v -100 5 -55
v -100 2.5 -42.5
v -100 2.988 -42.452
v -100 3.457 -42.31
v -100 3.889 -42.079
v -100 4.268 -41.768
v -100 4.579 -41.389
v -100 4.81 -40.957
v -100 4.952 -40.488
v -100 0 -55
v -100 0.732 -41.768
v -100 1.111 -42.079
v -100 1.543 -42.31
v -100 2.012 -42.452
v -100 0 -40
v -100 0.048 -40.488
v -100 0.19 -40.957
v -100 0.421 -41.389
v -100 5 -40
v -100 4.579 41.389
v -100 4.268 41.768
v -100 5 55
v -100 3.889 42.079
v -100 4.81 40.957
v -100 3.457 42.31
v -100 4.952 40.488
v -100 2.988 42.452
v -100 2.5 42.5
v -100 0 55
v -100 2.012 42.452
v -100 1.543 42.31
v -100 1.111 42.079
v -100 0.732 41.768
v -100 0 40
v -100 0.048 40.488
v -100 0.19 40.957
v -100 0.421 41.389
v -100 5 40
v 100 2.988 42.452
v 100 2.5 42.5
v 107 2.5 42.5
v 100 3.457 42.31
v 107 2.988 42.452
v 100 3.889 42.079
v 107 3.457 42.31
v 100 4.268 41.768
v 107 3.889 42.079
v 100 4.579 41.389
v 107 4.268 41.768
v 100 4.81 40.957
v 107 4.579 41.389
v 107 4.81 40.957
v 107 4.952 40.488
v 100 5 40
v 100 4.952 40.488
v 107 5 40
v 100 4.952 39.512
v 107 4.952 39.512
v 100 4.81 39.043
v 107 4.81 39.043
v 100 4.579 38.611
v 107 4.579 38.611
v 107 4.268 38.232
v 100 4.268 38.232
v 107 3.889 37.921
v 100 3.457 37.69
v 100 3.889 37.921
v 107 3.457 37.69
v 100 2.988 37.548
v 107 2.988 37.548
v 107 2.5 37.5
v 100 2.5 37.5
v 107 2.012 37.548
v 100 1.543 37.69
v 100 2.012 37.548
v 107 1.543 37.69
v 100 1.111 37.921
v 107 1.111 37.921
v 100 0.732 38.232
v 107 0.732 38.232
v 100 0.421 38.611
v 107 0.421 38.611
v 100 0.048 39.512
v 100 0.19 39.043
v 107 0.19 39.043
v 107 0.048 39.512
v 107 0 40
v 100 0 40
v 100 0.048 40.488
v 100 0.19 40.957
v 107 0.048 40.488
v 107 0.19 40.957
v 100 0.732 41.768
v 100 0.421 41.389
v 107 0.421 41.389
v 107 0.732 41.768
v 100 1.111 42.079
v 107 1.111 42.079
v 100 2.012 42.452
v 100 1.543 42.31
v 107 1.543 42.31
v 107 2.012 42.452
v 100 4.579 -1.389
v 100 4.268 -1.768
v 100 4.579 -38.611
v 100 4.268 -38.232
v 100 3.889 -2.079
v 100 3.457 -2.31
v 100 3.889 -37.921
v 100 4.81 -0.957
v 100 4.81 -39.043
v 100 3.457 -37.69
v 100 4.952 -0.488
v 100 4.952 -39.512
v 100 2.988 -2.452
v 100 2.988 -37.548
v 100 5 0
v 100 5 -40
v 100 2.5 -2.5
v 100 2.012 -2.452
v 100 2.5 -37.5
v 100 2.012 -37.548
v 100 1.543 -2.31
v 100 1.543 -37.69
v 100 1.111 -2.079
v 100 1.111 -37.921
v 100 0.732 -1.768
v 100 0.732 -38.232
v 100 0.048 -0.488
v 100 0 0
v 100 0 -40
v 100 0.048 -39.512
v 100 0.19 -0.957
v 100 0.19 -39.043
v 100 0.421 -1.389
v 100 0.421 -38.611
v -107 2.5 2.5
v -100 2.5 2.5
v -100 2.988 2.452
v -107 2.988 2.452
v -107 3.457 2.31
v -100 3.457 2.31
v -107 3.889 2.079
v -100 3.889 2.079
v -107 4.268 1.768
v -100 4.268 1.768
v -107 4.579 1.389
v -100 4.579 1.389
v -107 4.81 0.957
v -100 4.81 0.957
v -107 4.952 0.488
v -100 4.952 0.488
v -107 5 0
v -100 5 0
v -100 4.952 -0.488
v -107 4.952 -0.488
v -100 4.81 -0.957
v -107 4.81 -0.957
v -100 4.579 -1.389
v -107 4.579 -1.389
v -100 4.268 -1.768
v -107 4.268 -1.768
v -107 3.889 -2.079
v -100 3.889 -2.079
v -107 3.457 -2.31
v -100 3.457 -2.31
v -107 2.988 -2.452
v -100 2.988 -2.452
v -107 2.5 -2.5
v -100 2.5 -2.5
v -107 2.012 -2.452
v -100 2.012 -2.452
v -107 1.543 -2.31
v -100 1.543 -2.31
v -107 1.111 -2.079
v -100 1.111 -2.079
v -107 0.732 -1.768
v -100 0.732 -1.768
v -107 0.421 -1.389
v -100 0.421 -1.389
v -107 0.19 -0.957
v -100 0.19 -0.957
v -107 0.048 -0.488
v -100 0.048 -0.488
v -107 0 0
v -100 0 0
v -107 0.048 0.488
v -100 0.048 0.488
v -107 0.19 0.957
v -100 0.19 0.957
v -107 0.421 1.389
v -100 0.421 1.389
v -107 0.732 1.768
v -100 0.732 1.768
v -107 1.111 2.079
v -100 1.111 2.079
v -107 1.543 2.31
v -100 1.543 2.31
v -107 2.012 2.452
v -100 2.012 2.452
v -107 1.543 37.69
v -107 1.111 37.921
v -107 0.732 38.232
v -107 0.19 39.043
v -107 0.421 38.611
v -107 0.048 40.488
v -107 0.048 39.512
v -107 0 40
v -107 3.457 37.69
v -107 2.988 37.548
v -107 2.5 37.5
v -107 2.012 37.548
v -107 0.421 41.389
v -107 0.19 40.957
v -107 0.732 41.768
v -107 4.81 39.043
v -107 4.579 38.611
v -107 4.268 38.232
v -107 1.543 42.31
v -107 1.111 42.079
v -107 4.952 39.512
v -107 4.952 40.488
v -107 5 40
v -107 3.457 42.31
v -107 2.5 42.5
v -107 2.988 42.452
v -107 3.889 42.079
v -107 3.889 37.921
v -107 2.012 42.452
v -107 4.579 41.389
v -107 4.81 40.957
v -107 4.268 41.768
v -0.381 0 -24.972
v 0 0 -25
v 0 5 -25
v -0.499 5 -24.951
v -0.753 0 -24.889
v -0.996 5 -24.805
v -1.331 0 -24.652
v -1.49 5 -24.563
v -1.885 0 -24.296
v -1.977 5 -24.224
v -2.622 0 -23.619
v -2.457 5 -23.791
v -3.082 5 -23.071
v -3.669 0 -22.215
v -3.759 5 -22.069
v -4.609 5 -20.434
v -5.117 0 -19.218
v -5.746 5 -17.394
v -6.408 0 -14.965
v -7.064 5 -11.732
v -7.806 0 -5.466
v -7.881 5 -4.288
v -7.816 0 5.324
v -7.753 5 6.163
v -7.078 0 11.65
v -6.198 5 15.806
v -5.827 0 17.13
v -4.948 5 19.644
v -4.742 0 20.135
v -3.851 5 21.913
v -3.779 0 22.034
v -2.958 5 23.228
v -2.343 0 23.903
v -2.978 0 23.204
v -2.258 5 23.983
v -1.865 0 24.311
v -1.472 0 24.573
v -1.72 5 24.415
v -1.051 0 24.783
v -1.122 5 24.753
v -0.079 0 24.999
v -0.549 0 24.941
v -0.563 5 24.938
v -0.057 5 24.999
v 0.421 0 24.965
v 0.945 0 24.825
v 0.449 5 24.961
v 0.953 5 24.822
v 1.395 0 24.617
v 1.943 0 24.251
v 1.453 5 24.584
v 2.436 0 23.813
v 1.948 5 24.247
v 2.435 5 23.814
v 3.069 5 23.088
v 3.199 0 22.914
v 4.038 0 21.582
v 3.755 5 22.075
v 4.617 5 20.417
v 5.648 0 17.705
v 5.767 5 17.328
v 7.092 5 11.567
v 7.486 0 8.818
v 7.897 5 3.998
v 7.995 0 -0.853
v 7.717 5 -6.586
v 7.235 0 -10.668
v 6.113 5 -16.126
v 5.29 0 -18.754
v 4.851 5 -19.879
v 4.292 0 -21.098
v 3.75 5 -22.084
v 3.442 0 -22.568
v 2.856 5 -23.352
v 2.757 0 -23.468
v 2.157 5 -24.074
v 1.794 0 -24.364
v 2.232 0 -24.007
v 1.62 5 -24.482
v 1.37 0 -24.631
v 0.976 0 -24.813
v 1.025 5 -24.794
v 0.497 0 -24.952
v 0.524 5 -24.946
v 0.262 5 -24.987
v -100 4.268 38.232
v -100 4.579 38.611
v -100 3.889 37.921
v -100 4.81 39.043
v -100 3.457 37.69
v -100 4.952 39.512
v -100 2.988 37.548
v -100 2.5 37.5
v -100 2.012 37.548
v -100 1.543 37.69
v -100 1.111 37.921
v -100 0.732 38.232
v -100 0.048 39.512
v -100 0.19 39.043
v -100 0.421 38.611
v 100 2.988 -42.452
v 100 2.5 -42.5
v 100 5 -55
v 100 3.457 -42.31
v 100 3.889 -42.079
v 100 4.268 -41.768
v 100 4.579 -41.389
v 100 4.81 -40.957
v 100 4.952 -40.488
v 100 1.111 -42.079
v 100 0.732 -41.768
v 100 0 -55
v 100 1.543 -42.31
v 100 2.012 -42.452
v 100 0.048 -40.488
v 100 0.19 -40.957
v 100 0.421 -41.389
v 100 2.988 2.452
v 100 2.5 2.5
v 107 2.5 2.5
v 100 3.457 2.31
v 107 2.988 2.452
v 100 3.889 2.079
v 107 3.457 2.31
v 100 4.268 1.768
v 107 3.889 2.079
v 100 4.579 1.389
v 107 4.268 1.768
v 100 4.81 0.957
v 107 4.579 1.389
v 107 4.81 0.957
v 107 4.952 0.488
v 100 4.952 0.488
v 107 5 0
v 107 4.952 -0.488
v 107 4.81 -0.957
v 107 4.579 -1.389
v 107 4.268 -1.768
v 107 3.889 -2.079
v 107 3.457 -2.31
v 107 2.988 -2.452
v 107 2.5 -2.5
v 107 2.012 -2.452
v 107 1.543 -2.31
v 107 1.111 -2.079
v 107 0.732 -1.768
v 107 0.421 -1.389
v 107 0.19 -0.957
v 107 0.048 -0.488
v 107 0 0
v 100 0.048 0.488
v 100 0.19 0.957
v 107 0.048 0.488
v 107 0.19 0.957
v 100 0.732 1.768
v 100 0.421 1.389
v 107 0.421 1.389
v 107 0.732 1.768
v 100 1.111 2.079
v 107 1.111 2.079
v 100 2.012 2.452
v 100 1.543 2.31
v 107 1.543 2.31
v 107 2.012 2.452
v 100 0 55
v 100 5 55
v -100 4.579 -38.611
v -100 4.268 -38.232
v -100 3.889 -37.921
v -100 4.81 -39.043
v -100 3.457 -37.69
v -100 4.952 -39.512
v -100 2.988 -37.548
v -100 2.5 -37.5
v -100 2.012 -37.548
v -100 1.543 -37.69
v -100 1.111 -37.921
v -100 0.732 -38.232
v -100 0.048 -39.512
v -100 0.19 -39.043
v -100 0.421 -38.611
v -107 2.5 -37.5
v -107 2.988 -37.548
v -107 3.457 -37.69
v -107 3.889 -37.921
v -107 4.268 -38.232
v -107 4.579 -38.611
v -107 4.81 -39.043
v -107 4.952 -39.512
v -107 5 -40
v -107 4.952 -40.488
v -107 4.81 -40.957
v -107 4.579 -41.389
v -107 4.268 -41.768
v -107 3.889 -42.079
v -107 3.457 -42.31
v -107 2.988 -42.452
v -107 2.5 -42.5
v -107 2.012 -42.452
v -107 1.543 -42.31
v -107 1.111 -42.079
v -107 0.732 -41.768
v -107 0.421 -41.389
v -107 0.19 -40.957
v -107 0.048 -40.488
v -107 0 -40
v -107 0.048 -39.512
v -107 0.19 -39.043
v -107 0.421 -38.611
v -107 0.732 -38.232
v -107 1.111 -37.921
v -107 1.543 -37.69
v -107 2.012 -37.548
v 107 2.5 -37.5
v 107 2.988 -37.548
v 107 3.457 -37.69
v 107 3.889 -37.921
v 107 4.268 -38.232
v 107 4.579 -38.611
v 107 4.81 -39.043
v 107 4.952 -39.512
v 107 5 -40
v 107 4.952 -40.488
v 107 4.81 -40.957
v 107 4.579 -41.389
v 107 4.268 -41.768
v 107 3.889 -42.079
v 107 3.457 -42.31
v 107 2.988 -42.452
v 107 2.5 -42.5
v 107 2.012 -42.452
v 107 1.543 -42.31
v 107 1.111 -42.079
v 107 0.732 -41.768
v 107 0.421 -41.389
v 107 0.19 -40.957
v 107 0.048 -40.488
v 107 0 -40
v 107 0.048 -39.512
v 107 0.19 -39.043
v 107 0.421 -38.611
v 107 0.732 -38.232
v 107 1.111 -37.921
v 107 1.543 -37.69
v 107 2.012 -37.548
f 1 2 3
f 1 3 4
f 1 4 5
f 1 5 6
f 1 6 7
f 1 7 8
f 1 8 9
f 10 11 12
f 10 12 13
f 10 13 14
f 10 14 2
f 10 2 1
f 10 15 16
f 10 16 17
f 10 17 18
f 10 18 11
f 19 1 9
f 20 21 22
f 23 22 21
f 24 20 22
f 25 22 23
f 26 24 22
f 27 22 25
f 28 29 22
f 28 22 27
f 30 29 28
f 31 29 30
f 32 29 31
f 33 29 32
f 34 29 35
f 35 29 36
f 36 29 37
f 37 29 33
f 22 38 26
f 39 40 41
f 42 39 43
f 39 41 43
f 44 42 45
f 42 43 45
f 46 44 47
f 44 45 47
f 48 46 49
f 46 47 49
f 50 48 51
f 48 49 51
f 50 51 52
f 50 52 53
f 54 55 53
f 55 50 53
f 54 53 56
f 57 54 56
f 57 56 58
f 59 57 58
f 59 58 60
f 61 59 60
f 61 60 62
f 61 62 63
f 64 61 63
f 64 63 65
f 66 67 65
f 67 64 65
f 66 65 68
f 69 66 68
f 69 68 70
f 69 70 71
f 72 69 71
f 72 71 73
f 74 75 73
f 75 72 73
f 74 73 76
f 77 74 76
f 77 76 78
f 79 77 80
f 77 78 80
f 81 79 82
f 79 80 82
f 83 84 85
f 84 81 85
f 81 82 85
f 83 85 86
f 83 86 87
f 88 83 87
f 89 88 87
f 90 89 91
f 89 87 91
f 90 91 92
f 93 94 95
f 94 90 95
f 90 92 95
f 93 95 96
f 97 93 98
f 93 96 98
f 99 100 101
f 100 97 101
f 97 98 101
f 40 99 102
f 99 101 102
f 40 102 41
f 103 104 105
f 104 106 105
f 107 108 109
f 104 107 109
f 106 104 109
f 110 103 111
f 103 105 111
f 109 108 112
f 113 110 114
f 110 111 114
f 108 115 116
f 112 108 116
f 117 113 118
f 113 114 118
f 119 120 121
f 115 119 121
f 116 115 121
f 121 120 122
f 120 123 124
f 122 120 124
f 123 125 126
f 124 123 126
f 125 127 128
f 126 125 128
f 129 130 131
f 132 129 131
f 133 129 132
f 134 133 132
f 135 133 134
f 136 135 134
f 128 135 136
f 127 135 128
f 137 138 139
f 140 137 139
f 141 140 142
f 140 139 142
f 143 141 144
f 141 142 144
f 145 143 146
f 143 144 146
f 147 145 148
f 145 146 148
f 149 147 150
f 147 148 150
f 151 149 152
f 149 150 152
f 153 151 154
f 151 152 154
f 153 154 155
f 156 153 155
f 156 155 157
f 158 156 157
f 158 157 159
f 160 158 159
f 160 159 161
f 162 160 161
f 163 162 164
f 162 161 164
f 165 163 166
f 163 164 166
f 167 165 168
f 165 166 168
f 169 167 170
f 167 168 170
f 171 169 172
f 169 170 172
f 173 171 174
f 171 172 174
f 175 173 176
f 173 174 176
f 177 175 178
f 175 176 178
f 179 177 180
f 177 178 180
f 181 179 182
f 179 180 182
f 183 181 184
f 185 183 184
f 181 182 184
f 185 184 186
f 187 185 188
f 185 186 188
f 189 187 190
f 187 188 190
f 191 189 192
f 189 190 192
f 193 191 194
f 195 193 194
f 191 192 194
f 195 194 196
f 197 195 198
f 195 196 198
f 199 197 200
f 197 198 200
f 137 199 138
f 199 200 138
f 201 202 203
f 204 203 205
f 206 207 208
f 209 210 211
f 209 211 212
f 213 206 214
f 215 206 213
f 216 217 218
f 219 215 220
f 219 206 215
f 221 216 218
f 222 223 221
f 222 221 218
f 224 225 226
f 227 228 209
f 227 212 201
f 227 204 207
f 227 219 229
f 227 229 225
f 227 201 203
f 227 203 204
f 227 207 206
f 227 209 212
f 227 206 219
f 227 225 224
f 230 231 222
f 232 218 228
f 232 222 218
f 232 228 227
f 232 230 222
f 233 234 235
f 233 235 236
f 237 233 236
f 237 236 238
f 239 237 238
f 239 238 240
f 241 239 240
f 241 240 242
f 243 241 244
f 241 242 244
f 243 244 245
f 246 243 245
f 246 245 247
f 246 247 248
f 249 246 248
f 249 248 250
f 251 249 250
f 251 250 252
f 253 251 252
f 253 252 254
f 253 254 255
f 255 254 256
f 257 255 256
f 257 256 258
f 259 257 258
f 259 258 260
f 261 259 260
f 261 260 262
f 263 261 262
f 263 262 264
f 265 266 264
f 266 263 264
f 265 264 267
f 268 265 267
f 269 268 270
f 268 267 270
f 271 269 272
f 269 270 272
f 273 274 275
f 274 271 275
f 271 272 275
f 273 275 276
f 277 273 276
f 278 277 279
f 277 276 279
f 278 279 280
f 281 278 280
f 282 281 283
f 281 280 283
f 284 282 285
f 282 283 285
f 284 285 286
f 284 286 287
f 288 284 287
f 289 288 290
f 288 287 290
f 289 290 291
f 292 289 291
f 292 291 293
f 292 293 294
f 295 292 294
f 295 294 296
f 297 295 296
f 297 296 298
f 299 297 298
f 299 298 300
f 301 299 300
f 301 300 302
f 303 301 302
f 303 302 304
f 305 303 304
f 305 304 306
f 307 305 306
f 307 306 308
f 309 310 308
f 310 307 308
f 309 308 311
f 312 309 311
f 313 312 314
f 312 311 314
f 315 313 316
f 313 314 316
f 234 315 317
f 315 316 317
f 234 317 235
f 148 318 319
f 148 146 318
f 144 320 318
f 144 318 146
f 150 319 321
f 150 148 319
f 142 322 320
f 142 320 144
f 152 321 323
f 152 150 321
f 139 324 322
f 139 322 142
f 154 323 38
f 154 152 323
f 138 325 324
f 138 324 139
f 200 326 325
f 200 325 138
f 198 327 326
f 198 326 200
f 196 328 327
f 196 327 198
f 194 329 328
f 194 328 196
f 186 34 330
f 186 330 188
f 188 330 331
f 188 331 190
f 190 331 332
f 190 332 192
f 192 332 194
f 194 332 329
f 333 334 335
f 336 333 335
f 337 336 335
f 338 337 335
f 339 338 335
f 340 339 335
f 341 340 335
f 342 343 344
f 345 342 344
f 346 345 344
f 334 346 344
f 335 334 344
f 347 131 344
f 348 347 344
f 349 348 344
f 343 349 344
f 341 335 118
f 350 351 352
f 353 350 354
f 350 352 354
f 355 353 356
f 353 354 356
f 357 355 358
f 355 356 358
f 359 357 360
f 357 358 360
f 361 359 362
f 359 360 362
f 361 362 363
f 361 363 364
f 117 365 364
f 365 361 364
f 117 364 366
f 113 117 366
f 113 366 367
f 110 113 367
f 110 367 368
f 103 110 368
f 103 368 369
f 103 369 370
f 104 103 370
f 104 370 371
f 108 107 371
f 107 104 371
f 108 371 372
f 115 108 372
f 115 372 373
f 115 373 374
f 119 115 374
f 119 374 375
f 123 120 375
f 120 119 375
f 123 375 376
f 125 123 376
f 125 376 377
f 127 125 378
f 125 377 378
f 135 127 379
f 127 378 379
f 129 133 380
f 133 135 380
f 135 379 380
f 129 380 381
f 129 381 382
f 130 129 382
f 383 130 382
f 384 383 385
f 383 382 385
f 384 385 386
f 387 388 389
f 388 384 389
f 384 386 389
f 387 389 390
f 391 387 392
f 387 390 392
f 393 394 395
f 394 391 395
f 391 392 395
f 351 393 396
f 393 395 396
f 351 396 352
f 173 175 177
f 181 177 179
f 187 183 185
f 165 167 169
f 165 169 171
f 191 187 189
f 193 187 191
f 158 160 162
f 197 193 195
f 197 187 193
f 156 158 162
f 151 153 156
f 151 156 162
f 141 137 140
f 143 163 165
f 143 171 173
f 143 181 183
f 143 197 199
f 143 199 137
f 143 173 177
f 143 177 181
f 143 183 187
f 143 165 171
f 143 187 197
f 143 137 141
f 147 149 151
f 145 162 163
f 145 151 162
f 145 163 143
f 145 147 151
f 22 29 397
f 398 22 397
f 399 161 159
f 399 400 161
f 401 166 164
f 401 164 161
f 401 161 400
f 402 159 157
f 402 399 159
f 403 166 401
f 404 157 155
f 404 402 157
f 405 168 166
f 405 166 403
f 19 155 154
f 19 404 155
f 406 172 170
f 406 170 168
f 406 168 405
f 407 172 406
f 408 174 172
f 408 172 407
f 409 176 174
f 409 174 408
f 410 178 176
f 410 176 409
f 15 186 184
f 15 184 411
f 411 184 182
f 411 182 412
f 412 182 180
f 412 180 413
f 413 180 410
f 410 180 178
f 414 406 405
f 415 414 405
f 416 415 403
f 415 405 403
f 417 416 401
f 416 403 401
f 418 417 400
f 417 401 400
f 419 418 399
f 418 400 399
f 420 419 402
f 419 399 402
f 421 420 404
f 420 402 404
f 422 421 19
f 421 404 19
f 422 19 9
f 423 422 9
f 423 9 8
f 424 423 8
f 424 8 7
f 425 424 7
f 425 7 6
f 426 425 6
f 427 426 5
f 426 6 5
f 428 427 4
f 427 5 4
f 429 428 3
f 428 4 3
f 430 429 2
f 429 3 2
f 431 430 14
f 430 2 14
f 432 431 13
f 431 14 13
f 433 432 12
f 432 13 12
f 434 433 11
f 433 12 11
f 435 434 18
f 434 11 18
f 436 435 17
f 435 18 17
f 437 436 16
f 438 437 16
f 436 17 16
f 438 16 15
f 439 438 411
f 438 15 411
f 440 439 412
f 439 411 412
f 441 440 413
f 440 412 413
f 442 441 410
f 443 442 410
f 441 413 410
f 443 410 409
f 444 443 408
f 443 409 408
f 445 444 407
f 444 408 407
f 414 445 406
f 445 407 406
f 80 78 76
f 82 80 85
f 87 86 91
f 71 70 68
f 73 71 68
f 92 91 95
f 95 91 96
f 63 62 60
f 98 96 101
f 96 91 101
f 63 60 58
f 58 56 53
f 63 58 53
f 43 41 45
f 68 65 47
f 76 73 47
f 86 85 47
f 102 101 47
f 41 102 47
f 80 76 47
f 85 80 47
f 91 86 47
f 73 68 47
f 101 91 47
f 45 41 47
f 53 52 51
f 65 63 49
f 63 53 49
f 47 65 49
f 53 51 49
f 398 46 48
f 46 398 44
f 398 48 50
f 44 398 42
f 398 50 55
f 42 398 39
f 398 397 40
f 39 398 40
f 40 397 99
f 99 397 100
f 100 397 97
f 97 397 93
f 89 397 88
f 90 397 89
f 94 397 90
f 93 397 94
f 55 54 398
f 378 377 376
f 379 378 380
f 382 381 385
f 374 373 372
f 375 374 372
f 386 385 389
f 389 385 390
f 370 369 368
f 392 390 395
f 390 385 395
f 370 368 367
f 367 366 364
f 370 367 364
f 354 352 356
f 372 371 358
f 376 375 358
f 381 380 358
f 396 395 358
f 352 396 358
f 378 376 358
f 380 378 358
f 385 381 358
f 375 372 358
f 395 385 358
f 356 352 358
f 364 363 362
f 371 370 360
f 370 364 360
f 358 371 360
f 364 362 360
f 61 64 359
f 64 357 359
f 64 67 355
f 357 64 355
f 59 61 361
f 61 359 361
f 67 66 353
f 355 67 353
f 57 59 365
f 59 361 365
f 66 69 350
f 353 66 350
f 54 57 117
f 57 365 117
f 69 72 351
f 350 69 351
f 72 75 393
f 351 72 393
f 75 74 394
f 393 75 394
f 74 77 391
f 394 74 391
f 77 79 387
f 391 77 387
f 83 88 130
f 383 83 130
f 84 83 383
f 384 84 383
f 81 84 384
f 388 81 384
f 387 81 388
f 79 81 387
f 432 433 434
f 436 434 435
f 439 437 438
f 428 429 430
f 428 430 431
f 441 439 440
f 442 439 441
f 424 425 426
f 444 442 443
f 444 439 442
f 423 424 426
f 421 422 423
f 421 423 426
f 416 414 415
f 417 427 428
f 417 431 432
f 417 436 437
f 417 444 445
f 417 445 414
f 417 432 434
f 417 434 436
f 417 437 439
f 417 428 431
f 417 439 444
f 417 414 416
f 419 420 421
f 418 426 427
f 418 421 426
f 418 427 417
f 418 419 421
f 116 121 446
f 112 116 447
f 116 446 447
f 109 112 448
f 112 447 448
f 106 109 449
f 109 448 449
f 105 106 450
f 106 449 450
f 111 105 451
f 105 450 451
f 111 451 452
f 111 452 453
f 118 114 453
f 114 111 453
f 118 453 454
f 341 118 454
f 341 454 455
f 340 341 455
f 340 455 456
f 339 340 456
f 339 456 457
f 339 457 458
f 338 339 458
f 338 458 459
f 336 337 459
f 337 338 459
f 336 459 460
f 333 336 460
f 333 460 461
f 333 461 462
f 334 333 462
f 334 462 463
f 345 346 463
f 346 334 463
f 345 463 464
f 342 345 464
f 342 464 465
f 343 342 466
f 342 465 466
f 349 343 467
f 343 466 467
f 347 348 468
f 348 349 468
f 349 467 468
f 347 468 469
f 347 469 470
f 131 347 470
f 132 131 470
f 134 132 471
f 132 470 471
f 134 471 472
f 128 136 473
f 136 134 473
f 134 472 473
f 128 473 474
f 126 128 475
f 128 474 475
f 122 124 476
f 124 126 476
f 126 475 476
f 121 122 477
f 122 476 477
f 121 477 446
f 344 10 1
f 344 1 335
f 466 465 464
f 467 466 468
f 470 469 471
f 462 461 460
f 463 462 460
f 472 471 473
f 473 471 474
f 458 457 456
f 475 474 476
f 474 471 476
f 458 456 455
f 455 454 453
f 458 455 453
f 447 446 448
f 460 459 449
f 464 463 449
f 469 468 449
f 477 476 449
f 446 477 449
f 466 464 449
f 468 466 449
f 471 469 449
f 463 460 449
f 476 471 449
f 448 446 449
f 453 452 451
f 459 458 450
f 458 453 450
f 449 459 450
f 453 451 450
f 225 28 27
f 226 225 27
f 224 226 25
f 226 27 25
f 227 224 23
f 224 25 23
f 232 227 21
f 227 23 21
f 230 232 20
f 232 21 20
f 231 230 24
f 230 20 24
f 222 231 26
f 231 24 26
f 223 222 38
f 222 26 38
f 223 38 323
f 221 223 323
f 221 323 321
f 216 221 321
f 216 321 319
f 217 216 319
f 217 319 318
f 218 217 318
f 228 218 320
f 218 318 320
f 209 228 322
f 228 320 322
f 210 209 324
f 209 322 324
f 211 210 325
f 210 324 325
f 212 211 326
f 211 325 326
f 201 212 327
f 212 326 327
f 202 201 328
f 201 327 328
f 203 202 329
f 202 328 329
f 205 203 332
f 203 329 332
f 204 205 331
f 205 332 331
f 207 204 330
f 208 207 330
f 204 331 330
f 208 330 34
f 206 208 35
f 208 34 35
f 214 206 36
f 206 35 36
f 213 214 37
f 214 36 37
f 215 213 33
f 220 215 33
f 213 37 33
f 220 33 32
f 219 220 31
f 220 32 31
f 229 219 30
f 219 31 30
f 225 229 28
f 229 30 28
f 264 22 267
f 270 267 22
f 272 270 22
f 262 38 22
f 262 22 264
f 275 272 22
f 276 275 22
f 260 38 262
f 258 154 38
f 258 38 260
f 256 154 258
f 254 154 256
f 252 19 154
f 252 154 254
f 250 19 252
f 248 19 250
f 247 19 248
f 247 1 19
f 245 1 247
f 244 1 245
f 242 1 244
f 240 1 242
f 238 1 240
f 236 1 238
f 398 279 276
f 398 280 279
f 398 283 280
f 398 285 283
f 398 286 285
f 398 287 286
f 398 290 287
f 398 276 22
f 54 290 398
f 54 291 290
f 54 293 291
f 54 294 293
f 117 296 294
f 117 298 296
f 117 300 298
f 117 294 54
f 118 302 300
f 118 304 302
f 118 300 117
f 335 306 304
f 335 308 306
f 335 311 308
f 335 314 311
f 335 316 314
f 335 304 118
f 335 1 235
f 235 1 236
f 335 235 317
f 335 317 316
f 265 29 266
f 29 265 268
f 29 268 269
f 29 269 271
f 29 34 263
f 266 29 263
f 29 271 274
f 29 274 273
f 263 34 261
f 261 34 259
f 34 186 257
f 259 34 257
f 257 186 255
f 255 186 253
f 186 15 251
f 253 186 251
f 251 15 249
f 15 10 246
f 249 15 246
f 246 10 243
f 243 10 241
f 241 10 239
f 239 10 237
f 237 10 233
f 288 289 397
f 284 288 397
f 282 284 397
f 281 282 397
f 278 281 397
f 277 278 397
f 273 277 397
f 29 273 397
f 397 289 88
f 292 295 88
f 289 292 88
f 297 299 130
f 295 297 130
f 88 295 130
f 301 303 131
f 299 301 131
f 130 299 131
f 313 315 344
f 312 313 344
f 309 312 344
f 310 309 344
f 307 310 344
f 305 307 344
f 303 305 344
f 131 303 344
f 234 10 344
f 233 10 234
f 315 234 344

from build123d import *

# Parameters (mm, degrees)
SKETCH1_W                = 200
SKETCH1_H                = 110
BOSS_EXTRUDE1_DEPTH      = 5
BOSS_EXTRUDE2_DEPTH      = 7
BOSS_EXTRUDE2_DEPTH_BACK = 207
SKETCH2_R                = 2.5
SKETCH3_RX               = 25
SKETCH3_RY               = 8
CUT_EXTRUDE1_DEPTH       = 10


with BuildPart() as part:
    # Sketch1 → Boss-Extrude1 (new body)
    with BuildSketch(Plane(origin=(0, 0, 0), x_dir=(1, 0, 0), z_dir=(0, 1, 0))):
        Rectangle(SKETCH1_W, SKETCH1_H)
    extrude(amount=BOSS_EXTRUDE1_DEPTH)

    # Sketch2 → Boss-Extrude2 (add, two sides: drawn at the far end of the back side and taken through both)
    with BuildSketch(Plane.ZY.offset(100).offset(-BOSS_EXTRUDE2_DEPTH_BACK)):
        with Locations((-40, 2.5)):
            Circle(SKETCH2_R)
        with Locations((0, 2.5)):
            Circle(SKETCH2_R)
        with Locations((40, 2.5)):
            Circle(SKETCH2_R)
    extrude(amount=BOSS_EXTRUDE2_DEPTH + BOSS_EXTRUDE2_DEPTH_BACK)

    # Sketch3 → Cut-Extrude1 (cut)
    with BuildSketch(Plane(origin=(0, 5, 0), x_dir=(1, 0, 0), z_dir=(0, 1, 0))):
        with Locations(Location((0, 0), (0, 0, 90))):
            Ellipse(SKETCH3_RX, SKETCH3_RY)
    extrude(amount=-CUT_EXTRUDE1_DEPTH, mode=Mode.SUBTRACT)


solid = part.part
